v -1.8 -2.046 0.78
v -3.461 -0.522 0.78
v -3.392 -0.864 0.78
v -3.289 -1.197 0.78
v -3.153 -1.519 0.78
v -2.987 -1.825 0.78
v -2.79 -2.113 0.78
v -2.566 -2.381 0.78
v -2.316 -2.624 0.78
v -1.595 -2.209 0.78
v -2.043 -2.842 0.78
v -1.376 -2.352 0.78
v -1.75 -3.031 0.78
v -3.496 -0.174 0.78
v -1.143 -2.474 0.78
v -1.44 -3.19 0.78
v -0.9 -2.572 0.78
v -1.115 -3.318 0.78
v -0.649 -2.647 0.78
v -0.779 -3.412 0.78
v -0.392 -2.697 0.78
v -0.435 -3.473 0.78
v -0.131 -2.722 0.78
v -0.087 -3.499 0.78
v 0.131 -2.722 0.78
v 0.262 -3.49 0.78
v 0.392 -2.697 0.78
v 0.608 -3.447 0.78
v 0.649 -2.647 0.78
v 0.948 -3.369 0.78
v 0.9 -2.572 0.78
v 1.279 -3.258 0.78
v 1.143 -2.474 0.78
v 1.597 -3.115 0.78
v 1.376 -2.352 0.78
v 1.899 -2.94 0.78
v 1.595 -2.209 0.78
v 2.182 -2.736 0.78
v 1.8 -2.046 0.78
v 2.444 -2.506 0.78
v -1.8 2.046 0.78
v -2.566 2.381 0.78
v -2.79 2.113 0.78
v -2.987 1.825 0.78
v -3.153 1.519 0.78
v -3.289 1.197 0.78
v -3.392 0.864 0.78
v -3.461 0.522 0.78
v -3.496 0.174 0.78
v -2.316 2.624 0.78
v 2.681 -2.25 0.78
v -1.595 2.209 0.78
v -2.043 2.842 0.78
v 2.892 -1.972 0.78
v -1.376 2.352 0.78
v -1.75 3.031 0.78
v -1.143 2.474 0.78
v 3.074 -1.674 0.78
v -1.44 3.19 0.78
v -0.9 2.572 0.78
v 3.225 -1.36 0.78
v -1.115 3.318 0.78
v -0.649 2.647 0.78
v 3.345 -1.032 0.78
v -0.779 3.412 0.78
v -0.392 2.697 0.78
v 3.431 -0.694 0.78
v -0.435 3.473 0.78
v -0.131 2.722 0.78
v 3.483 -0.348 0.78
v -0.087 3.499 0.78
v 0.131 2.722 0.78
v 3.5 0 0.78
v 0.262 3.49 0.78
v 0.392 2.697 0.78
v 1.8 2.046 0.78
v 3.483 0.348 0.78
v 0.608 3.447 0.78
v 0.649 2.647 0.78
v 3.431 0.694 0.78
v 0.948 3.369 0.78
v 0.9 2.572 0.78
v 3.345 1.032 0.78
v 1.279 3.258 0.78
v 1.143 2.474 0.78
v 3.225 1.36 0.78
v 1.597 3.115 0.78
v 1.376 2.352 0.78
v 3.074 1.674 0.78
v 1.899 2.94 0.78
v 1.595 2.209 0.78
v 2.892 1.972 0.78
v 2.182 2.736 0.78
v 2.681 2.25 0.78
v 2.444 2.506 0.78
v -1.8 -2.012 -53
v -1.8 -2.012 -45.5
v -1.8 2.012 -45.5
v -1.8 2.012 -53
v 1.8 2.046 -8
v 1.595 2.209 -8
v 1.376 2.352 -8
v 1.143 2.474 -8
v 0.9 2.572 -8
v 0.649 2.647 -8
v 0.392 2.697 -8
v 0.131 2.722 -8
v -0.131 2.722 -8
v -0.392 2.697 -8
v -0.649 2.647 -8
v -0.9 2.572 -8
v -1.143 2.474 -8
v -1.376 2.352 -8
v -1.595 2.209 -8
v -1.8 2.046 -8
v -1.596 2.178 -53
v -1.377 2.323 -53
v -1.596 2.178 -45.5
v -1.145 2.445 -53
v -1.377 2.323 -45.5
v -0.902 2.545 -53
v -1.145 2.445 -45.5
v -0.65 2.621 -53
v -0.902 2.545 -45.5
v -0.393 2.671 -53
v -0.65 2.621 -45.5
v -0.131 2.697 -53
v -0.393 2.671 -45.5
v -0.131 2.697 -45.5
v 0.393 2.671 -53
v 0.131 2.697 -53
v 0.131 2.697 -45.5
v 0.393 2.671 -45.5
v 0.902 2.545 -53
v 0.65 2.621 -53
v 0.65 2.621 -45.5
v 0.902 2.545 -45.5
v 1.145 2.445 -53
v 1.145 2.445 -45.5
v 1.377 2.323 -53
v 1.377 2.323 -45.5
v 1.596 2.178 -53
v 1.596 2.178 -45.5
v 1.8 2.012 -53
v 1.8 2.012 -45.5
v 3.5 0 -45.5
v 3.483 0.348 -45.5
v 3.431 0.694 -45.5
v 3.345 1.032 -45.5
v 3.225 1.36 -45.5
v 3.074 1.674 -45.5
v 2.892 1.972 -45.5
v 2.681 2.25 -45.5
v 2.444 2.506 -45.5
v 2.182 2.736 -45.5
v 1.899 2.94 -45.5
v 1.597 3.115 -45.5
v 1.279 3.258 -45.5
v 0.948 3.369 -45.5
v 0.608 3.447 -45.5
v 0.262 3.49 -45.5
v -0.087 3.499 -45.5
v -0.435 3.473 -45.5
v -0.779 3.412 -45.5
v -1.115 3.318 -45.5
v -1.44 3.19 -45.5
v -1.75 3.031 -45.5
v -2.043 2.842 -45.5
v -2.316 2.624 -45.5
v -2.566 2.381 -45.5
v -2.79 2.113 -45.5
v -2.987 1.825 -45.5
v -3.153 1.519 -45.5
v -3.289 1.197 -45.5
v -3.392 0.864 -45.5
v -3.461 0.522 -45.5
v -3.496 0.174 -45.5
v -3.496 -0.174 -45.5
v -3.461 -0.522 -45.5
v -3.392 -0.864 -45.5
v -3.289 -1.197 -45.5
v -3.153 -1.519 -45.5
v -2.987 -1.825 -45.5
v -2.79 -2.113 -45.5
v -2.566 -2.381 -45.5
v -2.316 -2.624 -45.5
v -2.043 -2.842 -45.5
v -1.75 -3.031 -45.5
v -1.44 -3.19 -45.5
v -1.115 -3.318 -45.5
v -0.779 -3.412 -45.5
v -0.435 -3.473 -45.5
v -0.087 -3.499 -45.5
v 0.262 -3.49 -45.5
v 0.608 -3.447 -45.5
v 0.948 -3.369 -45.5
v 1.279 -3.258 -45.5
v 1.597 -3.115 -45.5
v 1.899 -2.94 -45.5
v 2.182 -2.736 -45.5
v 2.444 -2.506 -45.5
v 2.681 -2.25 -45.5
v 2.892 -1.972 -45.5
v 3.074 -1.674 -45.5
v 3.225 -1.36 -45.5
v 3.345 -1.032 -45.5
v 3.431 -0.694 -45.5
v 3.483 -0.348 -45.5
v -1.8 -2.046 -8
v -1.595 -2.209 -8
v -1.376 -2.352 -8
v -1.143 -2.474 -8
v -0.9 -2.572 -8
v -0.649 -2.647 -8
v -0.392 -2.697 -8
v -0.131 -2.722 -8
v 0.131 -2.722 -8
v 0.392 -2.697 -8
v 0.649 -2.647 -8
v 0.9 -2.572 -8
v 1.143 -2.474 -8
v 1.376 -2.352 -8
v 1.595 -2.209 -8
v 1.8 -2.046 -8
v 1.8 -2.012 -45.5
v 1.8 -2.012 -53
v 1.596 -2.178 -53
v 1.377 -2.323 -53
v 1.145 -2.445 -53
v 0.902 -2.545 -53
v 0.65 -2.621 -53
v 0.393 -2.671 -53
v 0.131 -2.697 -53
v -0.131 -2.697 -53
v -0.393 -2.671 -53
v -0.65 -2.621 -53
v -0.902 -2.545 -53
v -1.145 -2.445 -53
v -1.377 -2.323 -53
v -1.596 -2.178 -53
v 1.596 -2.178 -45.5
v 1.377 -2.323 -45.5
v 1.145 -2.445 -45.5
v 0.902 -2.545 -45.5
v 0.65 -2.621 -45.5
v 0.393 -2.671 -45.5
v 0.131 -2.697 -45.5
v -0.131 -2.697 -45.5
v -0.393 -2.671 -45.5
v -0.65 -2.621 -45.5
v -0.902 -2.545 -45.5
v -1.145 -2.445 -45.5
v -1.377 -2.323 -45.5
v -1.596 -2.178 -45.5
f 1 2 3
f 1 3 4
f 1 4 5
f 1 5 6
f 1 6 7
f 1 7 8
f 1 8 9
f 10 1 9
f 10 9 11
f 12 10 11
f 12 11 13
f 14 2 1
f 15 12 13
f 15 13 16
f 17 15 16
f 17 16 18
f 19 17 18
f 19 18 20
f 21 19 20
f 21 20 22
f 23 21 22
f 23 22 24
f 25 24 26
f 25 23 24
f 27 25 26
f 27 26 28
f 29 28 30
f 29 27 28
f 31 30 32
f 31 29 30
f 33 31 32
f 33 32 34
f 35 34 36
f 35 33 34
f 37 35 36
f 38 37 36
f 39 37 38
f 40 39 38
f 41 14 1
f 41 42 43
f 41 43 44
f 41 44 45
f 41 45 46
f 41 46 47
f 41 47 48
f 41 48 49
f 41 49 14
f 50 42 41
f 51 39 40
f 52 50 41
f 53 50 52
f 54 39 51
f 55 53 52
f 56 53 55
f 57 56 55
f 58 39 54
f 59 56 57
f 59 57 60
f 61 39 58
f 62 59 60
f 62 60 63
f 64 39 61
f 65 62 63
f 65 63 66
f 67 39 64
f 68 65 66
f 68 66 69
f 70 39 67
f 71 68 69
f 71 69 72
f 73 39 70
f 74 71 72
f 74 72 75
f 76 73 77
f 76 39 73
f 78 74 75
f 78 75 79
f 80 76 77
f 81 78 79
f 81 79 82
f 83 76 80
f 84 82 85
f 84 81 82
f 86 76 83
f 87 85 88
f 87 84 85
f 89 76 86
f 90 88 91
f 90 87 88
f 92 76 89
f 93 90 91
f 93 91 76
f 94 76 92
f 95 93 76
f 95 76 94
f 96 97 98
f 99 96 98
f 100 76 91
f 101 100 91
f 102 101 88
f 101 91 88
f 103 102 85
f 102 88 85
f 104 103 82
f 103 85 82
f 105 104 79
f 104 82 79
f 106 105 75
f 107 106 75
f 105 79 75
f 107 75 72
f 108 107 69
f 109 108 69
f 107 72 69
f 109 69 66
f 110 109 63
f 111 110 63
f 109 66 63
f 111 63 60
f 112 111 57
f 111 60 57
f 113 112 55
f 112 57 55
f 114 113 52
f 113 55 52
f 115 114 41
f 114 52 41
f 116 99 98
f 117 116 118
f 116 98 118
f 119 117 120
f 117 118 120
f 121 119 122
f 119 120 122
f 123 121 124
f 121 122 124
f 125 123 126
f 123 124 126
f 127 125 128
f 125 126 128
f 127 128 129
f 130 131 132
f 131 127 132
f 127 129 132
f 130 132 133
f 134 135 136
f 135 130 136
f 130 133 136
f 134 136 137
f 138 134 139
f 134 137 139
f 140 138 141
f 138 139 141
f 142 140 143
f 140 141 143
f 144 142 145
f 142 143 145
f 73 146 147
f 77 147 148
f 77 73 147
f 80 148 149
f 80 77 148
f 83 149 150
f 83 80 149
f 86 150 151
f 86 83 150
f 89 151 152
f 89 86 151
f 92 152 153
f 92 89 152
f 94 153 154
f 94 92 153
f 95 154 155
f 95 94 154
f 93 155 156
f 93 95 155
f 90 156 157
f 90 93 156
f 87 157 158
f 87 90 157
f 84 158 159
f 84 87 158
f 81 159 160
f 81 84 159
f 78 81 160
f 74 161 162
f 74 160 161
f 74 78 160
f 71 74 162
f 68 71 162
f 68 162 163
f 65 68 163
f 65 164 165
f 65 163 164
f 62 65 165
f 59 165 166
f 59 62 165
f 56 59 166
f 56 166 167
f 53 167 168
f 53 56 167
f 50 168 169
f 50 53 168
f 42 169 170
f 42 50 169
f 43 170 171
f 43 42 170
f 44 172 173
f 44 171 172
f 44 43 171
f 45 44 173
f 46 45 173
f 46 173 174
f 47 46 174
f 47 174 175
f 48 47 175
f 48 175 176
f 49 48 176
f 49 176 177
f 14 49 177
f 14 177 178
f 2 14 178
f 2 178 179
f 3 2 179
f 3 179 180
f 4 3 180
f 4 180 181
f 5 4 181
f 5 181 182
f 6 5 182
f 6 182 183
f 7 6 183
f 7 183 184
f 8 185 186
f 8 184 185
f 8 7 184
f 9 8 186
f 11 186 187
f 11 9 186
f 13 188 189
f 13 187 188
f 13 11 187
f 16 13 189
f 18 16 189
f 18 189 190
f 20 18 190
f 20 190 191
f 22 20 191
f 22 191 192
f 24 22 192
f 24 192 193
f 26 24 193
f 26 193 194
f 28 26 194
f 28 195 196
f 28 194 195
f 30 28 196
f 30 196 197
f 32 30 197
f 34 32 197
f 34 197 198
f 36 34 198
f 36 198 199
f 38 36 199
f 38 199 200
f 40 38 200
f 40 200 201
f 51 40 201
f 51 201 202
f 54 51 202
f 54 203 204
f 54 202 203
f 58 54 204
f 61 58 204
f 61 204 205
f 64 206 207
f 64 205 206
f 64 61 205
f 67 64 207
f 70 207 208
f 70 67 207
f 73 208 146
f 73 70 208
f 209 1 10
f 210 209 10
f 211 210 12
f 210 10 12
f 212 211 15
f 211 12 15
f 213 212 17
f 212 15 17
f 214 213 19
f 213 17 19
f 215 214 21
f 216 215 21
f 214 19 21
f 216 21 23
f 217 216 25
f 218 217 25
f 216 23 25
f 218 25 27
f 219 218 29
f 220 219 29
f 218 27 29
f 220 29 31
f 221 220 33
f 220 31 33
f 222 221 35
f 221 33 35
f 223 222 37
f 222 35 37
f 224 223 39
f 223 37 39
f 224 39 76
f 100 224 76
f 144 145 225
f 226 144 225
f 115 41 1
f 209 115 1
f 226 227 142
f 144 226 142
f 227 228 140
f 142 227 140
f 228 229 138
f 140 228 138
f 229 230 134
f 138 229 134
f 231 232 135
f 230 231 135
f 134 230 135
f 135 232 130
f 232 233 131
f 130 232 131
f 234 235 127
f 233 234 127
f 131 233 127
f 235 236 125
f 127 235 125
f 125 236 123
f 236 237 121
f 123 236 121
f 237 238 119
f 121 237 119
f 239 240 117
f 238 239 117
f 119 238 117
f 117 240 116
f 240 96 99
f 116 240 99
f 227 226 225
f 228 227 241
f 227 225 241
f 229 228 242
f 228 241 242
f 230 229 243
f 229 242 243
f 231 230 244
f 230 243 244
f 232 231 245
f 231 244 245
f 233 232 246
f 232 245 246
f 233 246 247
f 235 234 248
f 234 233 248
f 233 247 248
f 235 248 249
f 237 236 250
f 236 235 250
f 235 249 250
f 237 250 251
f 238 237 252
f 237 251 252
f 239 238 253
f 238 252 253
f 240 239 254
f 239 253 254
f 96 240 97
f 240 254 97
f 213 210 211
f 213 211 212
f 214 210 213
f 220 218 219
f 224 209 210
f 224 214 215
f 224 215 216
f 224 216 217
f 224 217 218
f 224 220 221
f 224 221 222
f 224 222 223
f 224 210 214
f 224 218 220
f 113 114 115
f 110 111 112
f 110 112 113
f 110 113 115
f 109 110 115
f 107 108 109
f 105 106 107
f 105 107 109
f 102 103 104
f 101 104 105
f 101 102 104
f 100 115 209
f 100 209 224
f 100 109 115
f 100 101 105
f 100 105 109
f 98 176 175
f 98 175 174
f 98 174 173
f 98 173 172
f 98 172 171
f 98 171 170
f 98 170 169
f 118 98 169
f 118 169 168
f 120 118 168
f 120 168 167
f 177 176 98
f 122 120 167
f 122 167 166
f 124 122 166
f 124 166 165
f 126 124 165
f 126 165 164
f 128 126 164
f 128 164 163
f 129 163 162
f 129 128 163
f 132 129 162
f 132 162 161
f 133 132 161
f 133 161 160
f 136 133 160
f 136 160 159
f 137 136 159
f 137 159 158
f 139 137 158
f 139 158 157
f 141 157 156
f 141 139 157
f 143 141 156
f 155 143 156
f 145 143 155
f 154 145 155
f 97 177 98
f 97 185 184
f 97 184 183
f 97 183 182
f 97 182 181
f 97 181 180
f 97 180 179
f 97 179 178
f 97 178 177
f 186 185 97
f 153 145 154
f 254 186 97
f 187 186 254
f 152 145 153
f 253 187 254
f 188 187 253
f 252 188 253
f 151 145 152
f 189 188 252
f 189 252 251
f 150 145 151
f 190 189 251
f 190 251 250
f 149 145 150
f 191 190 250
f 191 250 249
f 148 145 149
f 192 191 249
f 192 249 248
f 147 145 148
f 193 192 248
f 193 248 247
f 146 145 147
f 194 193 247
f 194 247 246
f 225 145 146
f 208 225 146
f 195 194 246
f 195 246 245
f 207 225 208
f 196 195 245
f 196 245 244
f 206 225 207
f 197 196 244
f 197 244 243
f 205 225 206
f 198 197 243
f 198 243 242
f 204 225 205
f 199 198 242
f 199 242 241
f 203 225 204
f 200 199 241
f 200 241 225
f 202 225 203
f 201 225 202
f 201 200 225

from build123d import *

# Parameters (mm, degrees)
CROQUIS1_R              = 3.5
SALIENTE_EXTRUIR1_DEPTH = 65.5
CORTAR_EXTRUIR3_DEPTH   = 8
CORTAR_EXTRUIR5_START   = -20
CROQUIS7_R              = 3.5
CORTAR_EXTRUIR5_DEPTH   = 20
CROQUIS8_W              = 12.617225576
CROQUIS8_H              = 9.28288649
CORTAR_EXTRUIR6_DEPTH   = 10
SALIENTE_EXTRUIR2_START = 2.5
CROQUIS10_R             = 3.5
SALIENTE_EXTRUIR2_DEPTH = 2.5
CROQUIS11_R             = 3.5
CORTAR_EXTRUIR7_DEPTH   = 1.72


with BuildPart() as part:
    # Croquis1 → Saliente-Extruir1 (new body)
    with BuildSketch(Plane.XY):
        Circle(CROQUIS1_R)
    extrude(amount=-SALIENTE_EXTRUIR1_DEPTH)

    # Croquis6 → Cortar-Extruir3 (cut)
    with BuildSketch(Plane.XY):
        with BuildLine():
            Line((-1.8, 2.045880006), (-1.8, -2.045880006))
            ThreePointArc((-1.8, -2.045880006), (0, -2.725), (1.8, -2.045880006))
            Line((1.8, -2.045880006), (1.8, 2.045880006))
            ThreePointArc((1.8, 2.045880006), (0, 2.725), (-1.8, 2.045880006))
        make_face()
    extrude(amount=-CORTAR_EXTRUIR3_DEPTH, mode=Mode.SUBTRACT)

    # Croquis7 → Cortar-Extruir5 (cut)
    with BuildSketch(Plane(origin=(0, 0, -65.5), x_dir=(-1, 0, 0), z_dir=(0, 0, -1)).offset(CORTAR_EXTRUIR5_START)):
        with Locations(Location((0, 0, 0), (0, 0, 180))):
            Circle(CROQUIS7_R)
        with BuildLine():
            ThreePointArc((1.8, 2.01246118), (0, 2.7), (-1.8, 2.01246118))
            Line((-1.8, 2.01246118), (-1.8, -2.01246118))
            ThreePointArc((-1.8, -2.01246118), (0, -2.7), (1.8, -2.01246118))
            Line((1.8, -2.01246118), (1.8, 2.01246118))
        make_face(mode=Mode.SUBTRACT)
    extrude(amount=CORTAR_EXTRUIR5_DEPTH, mode=Mode.SUBTRACT)

    # Croquis8 → Cortar-Extruir6 (cut)
    with BuildSketch(Plane.ZY.offset(1.8)):
        with Locations((-59.308612788, -0.436721269)):
            Rectangle(CROQUIS8_W, CROQUIS8_H)
    extrude(amount=-CORTAR_EXTRUIR6_DEPTH, mode=Mode.SUBTRACT)

    # Croquis10 → Saliente-Extruir2 (add)
    with BuildSketch(Plane.XY.offset(SALIENTE_EXTRUIR2_START)):
        Circle(CROQUIS10_R)
        with BuildLine():
            Line((-1.8, 2.045880006), (-1.8, -2.045880006))
            ThreePointArc((-1.8, -2.045880006), (0, -2.725), (1.8, -2.045880006))
            Line((1.8, -2.045880006), (1.8, 2.045880006))
            ThreePointArc((1.8, 2.045880006), (0, 2.725), (-1.8, 2.045880006))
        make_face(mode=Mode.SUBTRACT)
    extrude(amount=-SALIENTE_EXTRUIR2_DEPTH)

    # Croquis11 → Cortar-Extruir7 (cut)
    with BuildSketch(Plane.XY.offset(2.5)):
        Circle(CROQUIS11_R)
    extrude(amount=-CORTAR_EXTRUIR7_DEPTH, mode=Mode.SUBTRACT)


solid = part.part
